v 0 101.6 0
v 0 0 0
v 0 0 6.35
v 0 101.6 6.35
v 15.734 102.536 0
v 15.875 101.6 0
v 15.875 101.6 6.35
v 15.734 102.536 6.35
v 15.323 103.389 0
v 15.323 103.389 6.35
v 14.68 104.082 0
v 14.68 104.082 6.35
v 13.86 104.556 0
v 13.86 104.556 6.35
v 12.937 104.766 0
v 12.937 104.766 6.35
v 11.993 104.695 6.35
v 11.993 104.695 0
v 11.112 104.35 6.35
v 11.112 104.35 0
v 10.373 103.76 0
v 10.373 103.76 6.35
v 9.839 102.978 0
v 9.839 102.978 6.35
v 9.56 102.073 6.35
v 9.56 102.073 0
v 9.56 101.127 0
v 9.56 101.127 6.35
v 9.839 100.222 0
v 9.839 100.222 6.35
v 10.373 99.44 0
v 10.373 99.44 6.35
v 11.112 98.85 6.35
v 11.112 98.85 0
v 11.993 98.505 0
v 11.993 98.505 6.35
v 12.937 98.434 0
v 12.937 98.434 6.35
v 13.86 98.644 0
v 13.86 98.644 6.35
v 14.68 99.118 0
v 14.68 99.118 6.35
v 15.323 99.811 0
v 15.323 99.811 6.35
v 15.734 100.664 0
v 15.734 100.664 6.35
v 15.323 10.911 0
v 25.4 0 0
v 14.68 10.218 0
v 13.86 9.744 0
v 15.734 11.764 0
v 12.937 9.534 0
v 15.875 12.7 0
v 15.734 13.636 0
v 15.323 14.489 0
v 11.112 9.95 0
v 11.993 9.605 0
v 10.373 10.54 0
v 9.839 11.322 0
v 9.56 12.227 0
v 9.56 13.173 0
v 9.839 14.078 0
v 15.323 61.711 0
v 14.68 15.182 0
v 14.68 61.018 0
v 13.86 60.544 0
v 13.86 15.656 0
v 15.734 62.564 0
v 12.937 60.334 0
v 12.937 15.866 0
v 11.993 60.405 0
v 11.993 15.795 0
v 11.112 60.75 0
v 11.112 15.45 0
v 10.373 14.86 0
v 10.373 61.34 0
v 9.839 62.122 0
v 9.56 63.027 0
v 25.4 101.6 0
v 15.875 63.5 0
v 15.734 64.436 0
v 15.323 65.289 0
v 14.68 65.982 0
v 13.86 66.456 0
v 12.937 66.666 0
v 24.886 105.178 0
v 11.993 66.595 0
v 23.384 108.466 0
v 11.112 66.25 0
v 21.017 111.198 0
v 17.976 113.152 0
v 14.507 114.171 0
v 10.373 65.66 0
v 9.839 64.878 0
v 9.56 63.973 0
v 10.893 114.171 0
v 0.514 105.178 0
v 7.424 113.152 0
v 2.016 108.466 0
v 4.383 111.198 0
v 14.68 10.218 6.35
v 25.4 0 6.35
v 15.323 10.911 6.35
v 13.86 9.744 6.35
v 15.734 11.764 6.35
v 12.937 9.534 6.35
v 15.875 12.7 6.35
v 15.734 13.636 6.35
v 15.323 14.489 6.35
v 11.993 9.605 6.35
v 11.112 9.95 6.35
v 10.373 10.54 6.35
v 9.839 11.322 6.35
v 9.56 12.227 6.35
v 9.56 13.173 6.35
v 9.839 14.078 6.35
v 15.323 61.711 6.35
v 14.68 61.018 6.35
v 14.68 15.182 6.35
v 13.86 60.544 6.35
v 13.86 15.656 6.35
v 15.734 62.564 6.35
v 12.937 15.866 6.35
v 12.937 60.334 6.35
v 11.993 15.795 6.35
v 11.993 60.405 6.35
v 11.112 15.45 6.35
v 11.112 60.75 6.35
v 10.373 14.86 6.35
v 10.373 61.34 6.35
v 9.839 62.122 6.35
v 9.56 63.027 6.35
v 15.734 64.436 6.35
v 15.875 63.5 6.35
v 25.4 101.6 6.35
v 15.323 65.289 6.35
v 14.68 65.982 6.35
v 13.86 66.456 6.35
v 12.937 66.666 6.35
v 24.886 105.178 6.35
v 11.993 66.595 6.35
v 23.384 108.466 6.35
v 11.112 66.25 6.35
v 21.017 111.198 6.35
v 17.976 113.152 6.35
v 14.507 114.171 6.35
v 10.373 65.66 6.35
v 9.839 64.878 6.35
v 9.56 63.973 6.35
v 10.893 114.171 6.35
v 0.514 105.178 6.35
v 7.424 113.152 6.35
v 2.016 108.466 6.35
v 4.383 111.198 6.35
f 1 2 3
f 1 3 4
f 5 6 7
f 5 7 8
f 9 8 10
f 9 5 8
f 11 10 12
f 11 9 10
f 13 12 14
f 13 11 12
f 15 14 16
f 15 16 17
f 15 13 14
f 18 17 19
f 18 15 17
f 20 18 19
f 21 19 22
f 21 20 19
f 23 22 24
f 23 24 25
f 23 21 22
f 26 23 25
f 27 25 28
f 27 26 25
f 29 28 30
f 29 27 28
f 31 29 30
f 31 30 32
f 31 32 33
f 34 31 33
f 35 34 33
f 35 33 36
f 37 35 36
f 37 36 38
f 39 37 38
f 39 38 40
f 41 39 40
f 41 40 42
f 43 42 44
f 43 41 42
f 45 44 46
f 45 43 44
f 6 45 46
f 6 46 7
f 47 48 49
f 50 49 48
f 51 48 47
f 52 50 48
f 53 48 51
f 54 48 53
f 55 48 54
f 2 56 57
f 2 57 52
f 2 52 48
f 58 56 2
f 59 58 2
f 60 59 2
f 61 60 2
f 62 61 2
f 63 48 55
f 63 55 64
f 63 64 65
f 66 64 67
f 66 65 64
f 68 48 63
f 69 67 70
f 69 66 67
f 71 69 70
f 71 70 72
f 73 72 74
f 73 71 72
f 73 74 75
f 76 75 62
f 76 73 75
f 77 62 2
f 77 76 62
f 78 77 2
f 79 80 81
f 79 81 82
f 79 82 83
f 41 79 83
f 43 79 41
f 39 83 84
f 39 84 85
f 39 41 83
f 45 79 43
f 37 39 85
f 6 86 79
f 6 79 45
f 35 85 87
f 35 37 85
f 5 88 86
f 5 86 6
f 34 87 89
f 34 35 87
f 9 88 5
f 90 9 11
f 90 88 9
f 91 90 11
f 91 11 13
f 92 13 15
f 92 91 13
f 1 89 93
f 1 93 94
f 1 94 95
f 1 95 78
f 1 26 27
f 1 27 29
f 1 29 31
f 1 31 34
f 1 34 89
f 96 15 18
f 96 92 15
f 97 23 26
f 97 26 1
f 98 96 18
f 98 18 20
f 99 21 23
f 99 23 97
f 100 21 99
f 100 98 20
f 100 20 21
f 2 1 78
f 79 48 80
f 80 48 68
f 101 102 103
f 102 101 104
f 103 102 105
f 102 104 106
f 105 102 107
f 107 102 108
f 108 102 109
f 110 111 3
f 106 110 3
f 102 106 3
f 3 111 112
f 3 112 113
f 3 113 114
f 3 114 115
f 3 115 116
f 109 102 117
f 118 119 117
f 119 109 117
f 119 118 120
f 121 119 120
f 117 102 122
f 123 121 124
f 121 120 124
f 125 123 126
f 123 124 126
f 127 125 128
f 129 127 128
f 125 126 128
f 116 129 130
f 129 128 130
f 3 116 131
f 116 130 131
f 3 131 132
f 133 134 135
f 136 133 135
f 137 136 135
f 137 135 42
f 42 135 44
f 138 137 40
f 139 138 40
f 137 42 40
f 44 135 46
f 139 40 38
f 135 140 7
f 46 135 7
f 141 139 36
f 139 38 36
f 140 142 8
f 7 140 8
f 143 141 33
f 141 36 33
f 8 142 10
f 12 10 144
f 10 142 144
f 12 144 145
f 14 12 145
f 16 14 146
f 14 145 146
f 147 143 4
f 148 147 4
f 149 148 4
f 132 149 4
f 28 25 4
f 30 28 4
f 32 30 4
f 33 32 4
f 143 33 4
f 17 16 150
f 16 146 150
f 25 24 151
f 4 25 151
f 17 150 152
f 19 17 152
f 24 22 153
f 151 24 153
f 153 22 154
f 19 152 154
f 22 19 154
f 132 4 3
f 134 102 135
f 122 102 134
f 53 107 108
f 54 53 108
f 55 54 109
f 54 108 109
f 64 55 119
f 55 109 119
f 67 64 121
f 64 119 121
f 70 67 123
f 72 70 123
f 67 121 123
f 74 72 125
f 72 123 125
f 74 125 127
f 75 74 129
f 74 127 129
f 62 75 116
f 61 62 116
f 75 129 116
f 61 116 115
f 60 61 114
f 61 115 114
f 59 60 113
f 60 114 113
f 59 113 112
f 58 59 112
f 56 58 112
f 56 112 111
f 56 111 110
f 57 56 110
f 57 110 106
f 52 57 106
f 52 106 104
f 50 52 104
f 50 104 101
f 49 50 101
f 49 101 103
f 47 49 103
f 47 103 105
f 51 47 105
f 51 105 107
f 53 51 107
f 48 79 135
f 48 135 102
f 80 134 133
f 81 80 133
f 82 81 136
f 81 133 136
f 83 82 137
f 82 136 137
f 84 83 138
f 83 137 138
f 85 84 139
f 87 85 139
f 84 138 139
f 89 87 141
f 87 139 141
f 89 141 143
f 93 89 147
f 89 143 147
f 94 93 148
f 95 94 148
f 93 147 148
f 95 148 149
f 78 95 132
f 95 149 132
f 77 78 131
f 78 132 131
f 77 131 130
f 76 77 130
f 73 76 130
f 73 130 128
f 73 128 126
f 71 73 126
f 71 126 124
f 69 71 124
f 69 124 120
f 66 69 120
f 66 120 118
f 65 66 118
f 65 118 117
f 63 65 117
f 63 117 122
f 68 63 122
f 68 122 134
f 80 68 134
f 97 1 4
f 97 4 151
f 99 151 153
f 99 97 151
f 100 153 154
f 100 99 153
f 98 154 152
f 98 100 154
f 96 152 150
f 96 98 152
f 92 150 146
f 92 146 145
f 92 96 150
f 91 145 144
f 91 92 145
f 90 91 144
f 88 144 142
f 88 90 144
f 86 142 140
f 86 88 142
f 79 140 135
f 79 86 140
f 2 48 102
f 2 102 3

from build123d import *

# Parameters (mm, degrees)
SKETCH1_R           = 3.175
BOSS_EXTRUDE1_DEPTH = 6.35
SKETCH2_R           = 3.175
CUT_EXTRUDE1_DEPTH  = 118.260276735


with BuildPart() as part:
    # Sketch1 → Boss-Extrude1 (new body)
    with BuildSketch(Plane.XY):
        with BuildLine():
            Line((0, 0), (0, 101.6))
            ThreePointArc((0, 101.6), (12.7, 114.3), (25.4, 101.6))
            Line((25.4, 101.6), (25.4, 0))
            Line((25.4, 0), (0, 0))
        make_face()
        with Locations((12.7, 101.6)):
            Circle(SKETCH1_R, mode=Mode.SUBTRACT)
    extrude(amount=BOSS_EXTRUDE1_DEPTH)

    # Sketch2 → Cut-Extrude1 (cut, through all)
    with BuildSketch(Plane.XY.offset(6.35)):
        with Locations((12.7, 63.5)):
            Circle(SKETCH2_R)
        with Locations((12.7, 12.7)):
            Circle(SKETCH2_R)
    extrude(amount=-CUT_EXTRUDE1_DEPTH, mode=Mode.SUBTRACT)


solid = part.part
